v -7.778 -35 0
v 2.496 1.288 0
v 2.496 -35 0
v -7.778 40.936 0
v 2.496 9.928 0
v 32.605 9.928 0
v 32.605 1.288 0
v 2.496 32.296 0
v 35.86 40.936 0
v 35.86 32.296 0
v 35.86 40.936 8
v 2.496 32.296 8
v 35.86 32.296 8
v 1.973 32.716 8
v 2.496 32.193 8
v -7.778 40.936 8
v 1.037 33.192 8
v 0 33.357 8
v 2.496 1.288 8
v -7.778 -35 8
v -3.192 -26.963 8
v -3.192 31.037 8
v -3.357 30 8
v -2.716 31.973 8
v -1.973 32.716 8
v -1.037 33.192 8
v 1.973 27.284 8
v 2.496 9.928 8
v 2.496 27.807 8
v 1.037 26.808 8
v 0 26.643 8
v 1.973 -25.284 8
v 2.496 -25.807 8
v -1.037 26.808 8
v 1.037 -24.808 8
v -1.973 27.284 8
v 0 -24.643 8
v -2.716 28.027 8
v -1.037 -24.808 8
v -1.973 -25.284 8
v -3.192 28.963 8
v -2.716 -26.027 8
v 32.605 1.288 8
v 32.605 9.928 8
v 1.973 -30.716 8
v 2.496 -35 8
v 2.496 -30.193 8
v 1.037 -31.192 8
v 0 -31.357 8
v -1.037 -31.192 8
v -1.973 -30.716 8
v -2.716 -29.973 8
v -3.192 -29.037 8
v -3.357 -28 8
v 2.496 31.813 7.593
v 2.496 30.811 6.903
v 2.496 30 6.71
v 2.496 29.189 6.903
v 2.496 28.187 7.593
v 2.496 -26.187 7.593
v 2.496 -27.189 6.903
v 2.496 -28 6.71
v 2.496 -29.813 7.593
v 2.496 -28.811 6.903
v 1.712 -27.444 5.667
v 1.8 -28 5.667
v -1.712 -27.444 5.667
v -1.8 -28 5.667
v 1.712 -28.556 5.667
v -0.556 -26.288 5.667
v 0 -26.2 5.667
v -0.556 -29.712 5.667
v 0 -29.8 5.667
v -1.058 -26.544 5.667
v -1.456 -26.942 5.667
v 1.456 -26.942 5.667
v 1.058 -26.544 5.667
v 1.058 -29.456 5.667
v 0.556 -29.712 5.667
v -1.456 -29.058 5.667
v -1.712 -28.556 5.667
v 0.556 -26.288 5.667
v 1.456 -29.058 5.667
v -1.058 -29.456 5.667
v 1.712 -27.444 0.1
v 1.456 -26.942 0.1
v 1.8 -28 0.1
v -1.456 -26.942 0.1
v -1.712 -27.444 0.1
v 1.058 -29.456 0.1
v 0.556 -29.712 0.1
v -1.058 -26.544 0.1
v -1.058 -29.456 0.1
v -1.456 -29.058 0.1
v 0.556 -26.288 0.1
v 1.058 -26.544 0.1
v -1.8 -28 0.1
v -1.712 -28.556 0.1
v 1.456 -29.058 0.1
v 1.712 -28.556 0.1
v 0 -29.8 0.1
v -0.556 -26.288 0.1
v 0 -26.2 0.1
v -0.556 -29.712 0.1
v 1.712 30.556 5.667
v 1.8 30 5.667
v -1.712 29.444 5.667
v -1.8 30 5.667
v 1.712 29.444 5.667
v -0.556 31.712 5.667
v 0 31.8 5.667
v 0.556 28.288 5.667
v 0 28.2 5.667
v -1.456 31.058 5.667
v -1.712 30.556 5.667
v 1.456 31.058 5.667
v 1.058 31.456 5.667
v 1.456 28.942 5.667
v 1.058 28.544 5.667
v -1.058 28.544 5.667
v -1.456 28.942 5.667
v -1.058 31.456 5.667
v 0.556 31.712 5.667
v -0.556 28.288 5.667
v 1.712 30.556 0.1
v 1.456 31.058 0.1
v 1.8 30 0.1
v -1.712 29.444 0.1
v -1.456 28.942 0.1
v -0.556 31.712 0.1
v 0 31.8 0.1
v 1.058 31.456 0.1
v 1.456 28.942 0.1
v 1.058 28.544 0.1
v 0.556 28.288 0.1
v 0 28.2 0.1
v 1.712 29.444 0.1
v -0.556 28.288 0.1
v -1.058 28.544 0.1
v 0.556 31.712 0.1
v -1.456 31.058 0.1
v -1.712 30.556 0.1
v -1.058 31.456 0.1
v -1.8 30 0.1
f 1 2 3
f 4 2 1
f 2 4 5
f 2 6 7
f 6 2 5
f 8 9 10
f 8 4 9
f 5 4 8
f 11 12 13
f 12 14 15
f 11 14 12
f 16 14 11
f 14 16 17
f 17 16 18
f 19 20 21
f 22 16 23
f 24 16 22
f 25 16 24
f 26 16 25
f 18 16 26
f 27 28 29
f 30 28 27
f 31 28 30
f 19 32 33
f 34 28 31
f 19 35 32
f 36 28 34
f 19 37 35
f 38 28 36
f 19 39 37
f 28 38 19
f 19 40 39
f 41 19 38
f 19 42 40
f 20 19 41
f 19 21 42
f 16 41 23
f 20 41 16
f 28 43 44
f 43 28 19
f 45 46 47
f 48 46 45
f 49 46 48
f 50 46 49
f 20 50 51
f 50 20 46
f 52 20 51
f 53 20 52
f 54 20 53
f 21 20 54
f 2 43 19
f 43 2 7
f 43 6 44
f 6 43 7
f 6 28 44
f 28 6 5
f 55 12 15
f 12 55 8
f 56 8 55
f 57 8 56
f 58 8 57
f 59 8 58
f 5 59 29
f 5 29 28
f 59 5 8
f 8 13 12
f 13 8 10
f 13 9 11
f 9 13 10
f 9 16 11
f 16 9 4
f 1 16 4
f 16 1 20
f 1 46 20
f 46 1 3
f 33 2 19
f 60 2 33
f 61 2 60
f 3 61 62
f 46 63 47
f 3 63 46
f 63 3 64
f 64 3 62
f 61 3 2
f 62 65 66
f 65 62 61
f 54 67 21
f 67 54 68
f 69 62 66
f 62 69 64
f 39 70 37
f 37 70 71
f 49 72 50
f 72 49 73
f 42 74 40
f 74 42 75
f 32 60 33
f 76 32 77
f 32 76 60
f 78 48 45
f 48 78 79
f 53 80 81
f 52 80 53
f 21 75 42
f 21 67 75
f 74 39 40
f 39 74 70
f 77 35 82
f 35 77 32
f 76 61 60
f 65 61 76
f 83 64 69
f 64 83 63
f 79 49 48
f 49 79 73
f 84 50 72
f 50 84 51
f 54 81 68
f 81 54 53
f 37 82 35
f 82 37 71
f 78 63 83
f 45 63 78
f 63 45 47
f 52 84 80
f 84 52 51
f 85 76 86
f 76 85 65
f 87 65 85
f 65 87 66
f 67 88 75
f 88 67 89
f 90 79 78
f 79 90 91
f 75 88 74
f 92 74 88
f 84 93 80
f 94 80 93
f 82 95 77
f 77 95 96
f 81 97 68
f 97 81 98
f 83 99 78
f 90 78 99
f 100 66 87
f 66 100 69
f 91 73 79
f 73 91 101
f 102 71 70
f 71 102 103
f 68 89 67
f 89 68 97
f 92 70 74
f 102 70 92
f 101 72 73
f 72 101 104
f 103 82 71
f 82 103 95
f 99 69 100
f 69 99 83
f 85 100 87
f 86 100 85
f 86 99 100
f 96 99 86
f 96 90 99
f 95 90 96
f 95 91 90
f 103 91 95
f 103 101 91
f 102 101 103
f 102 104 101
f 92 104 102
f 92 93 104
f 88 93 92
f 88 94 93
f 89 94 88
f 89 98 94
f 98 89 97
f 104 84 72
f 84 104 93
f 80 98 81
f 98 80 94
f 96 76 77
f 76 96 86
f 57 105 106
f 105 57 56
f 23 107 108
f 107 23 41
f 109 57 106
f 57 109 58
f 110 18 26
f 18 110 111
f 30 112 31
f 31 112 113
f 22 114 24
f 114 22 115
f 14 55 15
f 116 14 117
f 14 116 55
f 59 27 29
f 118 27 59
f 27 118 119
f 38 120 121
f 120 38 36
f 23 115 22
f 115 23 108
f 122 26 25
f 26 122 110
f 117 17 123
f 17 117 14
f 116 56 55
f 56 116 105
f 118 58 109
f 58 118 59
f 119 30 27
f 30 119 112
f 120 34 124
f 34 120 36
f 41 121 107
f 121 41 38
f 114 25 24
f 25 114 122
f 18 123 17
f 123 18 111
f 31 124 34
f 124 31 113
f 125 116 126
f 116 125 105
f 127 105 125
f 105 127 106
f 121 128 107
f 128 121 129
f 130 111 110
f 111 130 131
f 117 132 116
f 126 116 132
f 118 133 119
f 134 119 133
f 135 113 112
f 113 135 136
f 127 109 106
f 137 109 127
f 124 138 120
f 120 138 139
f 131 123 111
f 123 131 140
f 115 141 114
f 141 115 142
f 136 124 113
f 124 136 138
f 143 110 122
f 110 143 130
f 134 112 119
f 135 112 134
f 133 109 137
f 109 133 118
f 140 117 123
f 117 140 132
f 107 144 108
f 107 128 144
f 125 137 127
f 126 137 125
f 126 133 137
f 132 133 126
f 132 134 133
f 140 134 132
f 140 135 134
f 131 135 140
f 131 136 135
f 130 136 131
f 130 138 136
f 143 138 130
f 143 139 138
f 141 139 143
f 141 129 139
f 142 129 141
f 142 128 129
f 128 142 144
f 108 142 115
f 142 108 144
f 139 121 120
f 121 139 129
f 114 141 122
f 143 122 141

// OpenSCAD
// Street Numbers for 3D printing
// Charles Tilford, 2019
// License: CC BY-NC-SA 4.0
//   https://creativecommons.org/licenses/by-nc-sa/4.0/

char="F";     // The number/letter to print

// Units are in mm, except for height of letter

// How many inches high should letter be?
inchesHigh=3;
// How thick/deep should letter be (mm)?
depth=8;

// Character coordinates just center the letter
charX=-18;    // Character X coord
charY=-35;    // Character Y coord
topScrew=30;  // Top screw Y coord
botScrew=-28; // Bottom screw Y coord
height=8;     // Thickness of character
// Screw dimensions. Default presumes
// #6 sheet metal screw
screwWid=3.6; // Width of screw shaft
screwTop=6.78;// Width of screw head
screwCon=5.08;// Height of head 'cone'

// Font to print in. Your system needs this
// installed, of course. If changed the hole
// positions almost certainly need to be
// changed, and maybe charX/charY.
fName="Open Sans Extrabold";
// https://fonts.google.com/specimen/Open+Sans
// Designer: Steve Matteson

// Thin floor below holes. My printer was
// struggling to have the hole 'border' stick
// to the stage. Just drill/screw thru it.
holeFloor=0.1; 

// ==========================================
// ===== All values below are auto-calculated
// ==========================================

// Scaled values
scaleFactor=inchesHigh / 3;
cX=charX * scaleFactor;
cY=charY * scaleFactor;
tS=topScrew * scaleFactor;
bS=botScrew * scaleFactor;
// Where do we start drawing screw head cone?
oS=depth - (screwCon-.05);

difference() {
  // We use difference() to punch out the screw holes
  // in the character
    
  // The character itself, 8mm thick
  translate([cX,cY,0])
    linear_extrude(height=depth, scale=1)
    text(char, size=(75*scaleFactor),
         $fn=100, font=fName);
    
  // Bottom screw hole
  translate([0,bS,oS]) color("red")
    cylinder(h=screwCon, d2=screwTop,
             d1=0, $fn=20);
   translate([0,bS,holeFloor])
    cylinder(h=20, d=screwWid, $fn=20);
    
  // Top screw hole
  translate([0,tS,oS]) color("red")
    cylinder(h=screwCon, d2=screwTop,
             d1=0, $fn=20);
  translate([0,tS,holeFloor])
    cylinder(h=20, d=screwWid, $fn=20);
}

// Colors are just to aid visualization of
// void spaces. $fn is "featuer number", ie how
// many polygons are devoted to object. The values
// above should be near your printing limit anyway.

// Developed in OpenSCAD
//    https://www.openscad.org/
